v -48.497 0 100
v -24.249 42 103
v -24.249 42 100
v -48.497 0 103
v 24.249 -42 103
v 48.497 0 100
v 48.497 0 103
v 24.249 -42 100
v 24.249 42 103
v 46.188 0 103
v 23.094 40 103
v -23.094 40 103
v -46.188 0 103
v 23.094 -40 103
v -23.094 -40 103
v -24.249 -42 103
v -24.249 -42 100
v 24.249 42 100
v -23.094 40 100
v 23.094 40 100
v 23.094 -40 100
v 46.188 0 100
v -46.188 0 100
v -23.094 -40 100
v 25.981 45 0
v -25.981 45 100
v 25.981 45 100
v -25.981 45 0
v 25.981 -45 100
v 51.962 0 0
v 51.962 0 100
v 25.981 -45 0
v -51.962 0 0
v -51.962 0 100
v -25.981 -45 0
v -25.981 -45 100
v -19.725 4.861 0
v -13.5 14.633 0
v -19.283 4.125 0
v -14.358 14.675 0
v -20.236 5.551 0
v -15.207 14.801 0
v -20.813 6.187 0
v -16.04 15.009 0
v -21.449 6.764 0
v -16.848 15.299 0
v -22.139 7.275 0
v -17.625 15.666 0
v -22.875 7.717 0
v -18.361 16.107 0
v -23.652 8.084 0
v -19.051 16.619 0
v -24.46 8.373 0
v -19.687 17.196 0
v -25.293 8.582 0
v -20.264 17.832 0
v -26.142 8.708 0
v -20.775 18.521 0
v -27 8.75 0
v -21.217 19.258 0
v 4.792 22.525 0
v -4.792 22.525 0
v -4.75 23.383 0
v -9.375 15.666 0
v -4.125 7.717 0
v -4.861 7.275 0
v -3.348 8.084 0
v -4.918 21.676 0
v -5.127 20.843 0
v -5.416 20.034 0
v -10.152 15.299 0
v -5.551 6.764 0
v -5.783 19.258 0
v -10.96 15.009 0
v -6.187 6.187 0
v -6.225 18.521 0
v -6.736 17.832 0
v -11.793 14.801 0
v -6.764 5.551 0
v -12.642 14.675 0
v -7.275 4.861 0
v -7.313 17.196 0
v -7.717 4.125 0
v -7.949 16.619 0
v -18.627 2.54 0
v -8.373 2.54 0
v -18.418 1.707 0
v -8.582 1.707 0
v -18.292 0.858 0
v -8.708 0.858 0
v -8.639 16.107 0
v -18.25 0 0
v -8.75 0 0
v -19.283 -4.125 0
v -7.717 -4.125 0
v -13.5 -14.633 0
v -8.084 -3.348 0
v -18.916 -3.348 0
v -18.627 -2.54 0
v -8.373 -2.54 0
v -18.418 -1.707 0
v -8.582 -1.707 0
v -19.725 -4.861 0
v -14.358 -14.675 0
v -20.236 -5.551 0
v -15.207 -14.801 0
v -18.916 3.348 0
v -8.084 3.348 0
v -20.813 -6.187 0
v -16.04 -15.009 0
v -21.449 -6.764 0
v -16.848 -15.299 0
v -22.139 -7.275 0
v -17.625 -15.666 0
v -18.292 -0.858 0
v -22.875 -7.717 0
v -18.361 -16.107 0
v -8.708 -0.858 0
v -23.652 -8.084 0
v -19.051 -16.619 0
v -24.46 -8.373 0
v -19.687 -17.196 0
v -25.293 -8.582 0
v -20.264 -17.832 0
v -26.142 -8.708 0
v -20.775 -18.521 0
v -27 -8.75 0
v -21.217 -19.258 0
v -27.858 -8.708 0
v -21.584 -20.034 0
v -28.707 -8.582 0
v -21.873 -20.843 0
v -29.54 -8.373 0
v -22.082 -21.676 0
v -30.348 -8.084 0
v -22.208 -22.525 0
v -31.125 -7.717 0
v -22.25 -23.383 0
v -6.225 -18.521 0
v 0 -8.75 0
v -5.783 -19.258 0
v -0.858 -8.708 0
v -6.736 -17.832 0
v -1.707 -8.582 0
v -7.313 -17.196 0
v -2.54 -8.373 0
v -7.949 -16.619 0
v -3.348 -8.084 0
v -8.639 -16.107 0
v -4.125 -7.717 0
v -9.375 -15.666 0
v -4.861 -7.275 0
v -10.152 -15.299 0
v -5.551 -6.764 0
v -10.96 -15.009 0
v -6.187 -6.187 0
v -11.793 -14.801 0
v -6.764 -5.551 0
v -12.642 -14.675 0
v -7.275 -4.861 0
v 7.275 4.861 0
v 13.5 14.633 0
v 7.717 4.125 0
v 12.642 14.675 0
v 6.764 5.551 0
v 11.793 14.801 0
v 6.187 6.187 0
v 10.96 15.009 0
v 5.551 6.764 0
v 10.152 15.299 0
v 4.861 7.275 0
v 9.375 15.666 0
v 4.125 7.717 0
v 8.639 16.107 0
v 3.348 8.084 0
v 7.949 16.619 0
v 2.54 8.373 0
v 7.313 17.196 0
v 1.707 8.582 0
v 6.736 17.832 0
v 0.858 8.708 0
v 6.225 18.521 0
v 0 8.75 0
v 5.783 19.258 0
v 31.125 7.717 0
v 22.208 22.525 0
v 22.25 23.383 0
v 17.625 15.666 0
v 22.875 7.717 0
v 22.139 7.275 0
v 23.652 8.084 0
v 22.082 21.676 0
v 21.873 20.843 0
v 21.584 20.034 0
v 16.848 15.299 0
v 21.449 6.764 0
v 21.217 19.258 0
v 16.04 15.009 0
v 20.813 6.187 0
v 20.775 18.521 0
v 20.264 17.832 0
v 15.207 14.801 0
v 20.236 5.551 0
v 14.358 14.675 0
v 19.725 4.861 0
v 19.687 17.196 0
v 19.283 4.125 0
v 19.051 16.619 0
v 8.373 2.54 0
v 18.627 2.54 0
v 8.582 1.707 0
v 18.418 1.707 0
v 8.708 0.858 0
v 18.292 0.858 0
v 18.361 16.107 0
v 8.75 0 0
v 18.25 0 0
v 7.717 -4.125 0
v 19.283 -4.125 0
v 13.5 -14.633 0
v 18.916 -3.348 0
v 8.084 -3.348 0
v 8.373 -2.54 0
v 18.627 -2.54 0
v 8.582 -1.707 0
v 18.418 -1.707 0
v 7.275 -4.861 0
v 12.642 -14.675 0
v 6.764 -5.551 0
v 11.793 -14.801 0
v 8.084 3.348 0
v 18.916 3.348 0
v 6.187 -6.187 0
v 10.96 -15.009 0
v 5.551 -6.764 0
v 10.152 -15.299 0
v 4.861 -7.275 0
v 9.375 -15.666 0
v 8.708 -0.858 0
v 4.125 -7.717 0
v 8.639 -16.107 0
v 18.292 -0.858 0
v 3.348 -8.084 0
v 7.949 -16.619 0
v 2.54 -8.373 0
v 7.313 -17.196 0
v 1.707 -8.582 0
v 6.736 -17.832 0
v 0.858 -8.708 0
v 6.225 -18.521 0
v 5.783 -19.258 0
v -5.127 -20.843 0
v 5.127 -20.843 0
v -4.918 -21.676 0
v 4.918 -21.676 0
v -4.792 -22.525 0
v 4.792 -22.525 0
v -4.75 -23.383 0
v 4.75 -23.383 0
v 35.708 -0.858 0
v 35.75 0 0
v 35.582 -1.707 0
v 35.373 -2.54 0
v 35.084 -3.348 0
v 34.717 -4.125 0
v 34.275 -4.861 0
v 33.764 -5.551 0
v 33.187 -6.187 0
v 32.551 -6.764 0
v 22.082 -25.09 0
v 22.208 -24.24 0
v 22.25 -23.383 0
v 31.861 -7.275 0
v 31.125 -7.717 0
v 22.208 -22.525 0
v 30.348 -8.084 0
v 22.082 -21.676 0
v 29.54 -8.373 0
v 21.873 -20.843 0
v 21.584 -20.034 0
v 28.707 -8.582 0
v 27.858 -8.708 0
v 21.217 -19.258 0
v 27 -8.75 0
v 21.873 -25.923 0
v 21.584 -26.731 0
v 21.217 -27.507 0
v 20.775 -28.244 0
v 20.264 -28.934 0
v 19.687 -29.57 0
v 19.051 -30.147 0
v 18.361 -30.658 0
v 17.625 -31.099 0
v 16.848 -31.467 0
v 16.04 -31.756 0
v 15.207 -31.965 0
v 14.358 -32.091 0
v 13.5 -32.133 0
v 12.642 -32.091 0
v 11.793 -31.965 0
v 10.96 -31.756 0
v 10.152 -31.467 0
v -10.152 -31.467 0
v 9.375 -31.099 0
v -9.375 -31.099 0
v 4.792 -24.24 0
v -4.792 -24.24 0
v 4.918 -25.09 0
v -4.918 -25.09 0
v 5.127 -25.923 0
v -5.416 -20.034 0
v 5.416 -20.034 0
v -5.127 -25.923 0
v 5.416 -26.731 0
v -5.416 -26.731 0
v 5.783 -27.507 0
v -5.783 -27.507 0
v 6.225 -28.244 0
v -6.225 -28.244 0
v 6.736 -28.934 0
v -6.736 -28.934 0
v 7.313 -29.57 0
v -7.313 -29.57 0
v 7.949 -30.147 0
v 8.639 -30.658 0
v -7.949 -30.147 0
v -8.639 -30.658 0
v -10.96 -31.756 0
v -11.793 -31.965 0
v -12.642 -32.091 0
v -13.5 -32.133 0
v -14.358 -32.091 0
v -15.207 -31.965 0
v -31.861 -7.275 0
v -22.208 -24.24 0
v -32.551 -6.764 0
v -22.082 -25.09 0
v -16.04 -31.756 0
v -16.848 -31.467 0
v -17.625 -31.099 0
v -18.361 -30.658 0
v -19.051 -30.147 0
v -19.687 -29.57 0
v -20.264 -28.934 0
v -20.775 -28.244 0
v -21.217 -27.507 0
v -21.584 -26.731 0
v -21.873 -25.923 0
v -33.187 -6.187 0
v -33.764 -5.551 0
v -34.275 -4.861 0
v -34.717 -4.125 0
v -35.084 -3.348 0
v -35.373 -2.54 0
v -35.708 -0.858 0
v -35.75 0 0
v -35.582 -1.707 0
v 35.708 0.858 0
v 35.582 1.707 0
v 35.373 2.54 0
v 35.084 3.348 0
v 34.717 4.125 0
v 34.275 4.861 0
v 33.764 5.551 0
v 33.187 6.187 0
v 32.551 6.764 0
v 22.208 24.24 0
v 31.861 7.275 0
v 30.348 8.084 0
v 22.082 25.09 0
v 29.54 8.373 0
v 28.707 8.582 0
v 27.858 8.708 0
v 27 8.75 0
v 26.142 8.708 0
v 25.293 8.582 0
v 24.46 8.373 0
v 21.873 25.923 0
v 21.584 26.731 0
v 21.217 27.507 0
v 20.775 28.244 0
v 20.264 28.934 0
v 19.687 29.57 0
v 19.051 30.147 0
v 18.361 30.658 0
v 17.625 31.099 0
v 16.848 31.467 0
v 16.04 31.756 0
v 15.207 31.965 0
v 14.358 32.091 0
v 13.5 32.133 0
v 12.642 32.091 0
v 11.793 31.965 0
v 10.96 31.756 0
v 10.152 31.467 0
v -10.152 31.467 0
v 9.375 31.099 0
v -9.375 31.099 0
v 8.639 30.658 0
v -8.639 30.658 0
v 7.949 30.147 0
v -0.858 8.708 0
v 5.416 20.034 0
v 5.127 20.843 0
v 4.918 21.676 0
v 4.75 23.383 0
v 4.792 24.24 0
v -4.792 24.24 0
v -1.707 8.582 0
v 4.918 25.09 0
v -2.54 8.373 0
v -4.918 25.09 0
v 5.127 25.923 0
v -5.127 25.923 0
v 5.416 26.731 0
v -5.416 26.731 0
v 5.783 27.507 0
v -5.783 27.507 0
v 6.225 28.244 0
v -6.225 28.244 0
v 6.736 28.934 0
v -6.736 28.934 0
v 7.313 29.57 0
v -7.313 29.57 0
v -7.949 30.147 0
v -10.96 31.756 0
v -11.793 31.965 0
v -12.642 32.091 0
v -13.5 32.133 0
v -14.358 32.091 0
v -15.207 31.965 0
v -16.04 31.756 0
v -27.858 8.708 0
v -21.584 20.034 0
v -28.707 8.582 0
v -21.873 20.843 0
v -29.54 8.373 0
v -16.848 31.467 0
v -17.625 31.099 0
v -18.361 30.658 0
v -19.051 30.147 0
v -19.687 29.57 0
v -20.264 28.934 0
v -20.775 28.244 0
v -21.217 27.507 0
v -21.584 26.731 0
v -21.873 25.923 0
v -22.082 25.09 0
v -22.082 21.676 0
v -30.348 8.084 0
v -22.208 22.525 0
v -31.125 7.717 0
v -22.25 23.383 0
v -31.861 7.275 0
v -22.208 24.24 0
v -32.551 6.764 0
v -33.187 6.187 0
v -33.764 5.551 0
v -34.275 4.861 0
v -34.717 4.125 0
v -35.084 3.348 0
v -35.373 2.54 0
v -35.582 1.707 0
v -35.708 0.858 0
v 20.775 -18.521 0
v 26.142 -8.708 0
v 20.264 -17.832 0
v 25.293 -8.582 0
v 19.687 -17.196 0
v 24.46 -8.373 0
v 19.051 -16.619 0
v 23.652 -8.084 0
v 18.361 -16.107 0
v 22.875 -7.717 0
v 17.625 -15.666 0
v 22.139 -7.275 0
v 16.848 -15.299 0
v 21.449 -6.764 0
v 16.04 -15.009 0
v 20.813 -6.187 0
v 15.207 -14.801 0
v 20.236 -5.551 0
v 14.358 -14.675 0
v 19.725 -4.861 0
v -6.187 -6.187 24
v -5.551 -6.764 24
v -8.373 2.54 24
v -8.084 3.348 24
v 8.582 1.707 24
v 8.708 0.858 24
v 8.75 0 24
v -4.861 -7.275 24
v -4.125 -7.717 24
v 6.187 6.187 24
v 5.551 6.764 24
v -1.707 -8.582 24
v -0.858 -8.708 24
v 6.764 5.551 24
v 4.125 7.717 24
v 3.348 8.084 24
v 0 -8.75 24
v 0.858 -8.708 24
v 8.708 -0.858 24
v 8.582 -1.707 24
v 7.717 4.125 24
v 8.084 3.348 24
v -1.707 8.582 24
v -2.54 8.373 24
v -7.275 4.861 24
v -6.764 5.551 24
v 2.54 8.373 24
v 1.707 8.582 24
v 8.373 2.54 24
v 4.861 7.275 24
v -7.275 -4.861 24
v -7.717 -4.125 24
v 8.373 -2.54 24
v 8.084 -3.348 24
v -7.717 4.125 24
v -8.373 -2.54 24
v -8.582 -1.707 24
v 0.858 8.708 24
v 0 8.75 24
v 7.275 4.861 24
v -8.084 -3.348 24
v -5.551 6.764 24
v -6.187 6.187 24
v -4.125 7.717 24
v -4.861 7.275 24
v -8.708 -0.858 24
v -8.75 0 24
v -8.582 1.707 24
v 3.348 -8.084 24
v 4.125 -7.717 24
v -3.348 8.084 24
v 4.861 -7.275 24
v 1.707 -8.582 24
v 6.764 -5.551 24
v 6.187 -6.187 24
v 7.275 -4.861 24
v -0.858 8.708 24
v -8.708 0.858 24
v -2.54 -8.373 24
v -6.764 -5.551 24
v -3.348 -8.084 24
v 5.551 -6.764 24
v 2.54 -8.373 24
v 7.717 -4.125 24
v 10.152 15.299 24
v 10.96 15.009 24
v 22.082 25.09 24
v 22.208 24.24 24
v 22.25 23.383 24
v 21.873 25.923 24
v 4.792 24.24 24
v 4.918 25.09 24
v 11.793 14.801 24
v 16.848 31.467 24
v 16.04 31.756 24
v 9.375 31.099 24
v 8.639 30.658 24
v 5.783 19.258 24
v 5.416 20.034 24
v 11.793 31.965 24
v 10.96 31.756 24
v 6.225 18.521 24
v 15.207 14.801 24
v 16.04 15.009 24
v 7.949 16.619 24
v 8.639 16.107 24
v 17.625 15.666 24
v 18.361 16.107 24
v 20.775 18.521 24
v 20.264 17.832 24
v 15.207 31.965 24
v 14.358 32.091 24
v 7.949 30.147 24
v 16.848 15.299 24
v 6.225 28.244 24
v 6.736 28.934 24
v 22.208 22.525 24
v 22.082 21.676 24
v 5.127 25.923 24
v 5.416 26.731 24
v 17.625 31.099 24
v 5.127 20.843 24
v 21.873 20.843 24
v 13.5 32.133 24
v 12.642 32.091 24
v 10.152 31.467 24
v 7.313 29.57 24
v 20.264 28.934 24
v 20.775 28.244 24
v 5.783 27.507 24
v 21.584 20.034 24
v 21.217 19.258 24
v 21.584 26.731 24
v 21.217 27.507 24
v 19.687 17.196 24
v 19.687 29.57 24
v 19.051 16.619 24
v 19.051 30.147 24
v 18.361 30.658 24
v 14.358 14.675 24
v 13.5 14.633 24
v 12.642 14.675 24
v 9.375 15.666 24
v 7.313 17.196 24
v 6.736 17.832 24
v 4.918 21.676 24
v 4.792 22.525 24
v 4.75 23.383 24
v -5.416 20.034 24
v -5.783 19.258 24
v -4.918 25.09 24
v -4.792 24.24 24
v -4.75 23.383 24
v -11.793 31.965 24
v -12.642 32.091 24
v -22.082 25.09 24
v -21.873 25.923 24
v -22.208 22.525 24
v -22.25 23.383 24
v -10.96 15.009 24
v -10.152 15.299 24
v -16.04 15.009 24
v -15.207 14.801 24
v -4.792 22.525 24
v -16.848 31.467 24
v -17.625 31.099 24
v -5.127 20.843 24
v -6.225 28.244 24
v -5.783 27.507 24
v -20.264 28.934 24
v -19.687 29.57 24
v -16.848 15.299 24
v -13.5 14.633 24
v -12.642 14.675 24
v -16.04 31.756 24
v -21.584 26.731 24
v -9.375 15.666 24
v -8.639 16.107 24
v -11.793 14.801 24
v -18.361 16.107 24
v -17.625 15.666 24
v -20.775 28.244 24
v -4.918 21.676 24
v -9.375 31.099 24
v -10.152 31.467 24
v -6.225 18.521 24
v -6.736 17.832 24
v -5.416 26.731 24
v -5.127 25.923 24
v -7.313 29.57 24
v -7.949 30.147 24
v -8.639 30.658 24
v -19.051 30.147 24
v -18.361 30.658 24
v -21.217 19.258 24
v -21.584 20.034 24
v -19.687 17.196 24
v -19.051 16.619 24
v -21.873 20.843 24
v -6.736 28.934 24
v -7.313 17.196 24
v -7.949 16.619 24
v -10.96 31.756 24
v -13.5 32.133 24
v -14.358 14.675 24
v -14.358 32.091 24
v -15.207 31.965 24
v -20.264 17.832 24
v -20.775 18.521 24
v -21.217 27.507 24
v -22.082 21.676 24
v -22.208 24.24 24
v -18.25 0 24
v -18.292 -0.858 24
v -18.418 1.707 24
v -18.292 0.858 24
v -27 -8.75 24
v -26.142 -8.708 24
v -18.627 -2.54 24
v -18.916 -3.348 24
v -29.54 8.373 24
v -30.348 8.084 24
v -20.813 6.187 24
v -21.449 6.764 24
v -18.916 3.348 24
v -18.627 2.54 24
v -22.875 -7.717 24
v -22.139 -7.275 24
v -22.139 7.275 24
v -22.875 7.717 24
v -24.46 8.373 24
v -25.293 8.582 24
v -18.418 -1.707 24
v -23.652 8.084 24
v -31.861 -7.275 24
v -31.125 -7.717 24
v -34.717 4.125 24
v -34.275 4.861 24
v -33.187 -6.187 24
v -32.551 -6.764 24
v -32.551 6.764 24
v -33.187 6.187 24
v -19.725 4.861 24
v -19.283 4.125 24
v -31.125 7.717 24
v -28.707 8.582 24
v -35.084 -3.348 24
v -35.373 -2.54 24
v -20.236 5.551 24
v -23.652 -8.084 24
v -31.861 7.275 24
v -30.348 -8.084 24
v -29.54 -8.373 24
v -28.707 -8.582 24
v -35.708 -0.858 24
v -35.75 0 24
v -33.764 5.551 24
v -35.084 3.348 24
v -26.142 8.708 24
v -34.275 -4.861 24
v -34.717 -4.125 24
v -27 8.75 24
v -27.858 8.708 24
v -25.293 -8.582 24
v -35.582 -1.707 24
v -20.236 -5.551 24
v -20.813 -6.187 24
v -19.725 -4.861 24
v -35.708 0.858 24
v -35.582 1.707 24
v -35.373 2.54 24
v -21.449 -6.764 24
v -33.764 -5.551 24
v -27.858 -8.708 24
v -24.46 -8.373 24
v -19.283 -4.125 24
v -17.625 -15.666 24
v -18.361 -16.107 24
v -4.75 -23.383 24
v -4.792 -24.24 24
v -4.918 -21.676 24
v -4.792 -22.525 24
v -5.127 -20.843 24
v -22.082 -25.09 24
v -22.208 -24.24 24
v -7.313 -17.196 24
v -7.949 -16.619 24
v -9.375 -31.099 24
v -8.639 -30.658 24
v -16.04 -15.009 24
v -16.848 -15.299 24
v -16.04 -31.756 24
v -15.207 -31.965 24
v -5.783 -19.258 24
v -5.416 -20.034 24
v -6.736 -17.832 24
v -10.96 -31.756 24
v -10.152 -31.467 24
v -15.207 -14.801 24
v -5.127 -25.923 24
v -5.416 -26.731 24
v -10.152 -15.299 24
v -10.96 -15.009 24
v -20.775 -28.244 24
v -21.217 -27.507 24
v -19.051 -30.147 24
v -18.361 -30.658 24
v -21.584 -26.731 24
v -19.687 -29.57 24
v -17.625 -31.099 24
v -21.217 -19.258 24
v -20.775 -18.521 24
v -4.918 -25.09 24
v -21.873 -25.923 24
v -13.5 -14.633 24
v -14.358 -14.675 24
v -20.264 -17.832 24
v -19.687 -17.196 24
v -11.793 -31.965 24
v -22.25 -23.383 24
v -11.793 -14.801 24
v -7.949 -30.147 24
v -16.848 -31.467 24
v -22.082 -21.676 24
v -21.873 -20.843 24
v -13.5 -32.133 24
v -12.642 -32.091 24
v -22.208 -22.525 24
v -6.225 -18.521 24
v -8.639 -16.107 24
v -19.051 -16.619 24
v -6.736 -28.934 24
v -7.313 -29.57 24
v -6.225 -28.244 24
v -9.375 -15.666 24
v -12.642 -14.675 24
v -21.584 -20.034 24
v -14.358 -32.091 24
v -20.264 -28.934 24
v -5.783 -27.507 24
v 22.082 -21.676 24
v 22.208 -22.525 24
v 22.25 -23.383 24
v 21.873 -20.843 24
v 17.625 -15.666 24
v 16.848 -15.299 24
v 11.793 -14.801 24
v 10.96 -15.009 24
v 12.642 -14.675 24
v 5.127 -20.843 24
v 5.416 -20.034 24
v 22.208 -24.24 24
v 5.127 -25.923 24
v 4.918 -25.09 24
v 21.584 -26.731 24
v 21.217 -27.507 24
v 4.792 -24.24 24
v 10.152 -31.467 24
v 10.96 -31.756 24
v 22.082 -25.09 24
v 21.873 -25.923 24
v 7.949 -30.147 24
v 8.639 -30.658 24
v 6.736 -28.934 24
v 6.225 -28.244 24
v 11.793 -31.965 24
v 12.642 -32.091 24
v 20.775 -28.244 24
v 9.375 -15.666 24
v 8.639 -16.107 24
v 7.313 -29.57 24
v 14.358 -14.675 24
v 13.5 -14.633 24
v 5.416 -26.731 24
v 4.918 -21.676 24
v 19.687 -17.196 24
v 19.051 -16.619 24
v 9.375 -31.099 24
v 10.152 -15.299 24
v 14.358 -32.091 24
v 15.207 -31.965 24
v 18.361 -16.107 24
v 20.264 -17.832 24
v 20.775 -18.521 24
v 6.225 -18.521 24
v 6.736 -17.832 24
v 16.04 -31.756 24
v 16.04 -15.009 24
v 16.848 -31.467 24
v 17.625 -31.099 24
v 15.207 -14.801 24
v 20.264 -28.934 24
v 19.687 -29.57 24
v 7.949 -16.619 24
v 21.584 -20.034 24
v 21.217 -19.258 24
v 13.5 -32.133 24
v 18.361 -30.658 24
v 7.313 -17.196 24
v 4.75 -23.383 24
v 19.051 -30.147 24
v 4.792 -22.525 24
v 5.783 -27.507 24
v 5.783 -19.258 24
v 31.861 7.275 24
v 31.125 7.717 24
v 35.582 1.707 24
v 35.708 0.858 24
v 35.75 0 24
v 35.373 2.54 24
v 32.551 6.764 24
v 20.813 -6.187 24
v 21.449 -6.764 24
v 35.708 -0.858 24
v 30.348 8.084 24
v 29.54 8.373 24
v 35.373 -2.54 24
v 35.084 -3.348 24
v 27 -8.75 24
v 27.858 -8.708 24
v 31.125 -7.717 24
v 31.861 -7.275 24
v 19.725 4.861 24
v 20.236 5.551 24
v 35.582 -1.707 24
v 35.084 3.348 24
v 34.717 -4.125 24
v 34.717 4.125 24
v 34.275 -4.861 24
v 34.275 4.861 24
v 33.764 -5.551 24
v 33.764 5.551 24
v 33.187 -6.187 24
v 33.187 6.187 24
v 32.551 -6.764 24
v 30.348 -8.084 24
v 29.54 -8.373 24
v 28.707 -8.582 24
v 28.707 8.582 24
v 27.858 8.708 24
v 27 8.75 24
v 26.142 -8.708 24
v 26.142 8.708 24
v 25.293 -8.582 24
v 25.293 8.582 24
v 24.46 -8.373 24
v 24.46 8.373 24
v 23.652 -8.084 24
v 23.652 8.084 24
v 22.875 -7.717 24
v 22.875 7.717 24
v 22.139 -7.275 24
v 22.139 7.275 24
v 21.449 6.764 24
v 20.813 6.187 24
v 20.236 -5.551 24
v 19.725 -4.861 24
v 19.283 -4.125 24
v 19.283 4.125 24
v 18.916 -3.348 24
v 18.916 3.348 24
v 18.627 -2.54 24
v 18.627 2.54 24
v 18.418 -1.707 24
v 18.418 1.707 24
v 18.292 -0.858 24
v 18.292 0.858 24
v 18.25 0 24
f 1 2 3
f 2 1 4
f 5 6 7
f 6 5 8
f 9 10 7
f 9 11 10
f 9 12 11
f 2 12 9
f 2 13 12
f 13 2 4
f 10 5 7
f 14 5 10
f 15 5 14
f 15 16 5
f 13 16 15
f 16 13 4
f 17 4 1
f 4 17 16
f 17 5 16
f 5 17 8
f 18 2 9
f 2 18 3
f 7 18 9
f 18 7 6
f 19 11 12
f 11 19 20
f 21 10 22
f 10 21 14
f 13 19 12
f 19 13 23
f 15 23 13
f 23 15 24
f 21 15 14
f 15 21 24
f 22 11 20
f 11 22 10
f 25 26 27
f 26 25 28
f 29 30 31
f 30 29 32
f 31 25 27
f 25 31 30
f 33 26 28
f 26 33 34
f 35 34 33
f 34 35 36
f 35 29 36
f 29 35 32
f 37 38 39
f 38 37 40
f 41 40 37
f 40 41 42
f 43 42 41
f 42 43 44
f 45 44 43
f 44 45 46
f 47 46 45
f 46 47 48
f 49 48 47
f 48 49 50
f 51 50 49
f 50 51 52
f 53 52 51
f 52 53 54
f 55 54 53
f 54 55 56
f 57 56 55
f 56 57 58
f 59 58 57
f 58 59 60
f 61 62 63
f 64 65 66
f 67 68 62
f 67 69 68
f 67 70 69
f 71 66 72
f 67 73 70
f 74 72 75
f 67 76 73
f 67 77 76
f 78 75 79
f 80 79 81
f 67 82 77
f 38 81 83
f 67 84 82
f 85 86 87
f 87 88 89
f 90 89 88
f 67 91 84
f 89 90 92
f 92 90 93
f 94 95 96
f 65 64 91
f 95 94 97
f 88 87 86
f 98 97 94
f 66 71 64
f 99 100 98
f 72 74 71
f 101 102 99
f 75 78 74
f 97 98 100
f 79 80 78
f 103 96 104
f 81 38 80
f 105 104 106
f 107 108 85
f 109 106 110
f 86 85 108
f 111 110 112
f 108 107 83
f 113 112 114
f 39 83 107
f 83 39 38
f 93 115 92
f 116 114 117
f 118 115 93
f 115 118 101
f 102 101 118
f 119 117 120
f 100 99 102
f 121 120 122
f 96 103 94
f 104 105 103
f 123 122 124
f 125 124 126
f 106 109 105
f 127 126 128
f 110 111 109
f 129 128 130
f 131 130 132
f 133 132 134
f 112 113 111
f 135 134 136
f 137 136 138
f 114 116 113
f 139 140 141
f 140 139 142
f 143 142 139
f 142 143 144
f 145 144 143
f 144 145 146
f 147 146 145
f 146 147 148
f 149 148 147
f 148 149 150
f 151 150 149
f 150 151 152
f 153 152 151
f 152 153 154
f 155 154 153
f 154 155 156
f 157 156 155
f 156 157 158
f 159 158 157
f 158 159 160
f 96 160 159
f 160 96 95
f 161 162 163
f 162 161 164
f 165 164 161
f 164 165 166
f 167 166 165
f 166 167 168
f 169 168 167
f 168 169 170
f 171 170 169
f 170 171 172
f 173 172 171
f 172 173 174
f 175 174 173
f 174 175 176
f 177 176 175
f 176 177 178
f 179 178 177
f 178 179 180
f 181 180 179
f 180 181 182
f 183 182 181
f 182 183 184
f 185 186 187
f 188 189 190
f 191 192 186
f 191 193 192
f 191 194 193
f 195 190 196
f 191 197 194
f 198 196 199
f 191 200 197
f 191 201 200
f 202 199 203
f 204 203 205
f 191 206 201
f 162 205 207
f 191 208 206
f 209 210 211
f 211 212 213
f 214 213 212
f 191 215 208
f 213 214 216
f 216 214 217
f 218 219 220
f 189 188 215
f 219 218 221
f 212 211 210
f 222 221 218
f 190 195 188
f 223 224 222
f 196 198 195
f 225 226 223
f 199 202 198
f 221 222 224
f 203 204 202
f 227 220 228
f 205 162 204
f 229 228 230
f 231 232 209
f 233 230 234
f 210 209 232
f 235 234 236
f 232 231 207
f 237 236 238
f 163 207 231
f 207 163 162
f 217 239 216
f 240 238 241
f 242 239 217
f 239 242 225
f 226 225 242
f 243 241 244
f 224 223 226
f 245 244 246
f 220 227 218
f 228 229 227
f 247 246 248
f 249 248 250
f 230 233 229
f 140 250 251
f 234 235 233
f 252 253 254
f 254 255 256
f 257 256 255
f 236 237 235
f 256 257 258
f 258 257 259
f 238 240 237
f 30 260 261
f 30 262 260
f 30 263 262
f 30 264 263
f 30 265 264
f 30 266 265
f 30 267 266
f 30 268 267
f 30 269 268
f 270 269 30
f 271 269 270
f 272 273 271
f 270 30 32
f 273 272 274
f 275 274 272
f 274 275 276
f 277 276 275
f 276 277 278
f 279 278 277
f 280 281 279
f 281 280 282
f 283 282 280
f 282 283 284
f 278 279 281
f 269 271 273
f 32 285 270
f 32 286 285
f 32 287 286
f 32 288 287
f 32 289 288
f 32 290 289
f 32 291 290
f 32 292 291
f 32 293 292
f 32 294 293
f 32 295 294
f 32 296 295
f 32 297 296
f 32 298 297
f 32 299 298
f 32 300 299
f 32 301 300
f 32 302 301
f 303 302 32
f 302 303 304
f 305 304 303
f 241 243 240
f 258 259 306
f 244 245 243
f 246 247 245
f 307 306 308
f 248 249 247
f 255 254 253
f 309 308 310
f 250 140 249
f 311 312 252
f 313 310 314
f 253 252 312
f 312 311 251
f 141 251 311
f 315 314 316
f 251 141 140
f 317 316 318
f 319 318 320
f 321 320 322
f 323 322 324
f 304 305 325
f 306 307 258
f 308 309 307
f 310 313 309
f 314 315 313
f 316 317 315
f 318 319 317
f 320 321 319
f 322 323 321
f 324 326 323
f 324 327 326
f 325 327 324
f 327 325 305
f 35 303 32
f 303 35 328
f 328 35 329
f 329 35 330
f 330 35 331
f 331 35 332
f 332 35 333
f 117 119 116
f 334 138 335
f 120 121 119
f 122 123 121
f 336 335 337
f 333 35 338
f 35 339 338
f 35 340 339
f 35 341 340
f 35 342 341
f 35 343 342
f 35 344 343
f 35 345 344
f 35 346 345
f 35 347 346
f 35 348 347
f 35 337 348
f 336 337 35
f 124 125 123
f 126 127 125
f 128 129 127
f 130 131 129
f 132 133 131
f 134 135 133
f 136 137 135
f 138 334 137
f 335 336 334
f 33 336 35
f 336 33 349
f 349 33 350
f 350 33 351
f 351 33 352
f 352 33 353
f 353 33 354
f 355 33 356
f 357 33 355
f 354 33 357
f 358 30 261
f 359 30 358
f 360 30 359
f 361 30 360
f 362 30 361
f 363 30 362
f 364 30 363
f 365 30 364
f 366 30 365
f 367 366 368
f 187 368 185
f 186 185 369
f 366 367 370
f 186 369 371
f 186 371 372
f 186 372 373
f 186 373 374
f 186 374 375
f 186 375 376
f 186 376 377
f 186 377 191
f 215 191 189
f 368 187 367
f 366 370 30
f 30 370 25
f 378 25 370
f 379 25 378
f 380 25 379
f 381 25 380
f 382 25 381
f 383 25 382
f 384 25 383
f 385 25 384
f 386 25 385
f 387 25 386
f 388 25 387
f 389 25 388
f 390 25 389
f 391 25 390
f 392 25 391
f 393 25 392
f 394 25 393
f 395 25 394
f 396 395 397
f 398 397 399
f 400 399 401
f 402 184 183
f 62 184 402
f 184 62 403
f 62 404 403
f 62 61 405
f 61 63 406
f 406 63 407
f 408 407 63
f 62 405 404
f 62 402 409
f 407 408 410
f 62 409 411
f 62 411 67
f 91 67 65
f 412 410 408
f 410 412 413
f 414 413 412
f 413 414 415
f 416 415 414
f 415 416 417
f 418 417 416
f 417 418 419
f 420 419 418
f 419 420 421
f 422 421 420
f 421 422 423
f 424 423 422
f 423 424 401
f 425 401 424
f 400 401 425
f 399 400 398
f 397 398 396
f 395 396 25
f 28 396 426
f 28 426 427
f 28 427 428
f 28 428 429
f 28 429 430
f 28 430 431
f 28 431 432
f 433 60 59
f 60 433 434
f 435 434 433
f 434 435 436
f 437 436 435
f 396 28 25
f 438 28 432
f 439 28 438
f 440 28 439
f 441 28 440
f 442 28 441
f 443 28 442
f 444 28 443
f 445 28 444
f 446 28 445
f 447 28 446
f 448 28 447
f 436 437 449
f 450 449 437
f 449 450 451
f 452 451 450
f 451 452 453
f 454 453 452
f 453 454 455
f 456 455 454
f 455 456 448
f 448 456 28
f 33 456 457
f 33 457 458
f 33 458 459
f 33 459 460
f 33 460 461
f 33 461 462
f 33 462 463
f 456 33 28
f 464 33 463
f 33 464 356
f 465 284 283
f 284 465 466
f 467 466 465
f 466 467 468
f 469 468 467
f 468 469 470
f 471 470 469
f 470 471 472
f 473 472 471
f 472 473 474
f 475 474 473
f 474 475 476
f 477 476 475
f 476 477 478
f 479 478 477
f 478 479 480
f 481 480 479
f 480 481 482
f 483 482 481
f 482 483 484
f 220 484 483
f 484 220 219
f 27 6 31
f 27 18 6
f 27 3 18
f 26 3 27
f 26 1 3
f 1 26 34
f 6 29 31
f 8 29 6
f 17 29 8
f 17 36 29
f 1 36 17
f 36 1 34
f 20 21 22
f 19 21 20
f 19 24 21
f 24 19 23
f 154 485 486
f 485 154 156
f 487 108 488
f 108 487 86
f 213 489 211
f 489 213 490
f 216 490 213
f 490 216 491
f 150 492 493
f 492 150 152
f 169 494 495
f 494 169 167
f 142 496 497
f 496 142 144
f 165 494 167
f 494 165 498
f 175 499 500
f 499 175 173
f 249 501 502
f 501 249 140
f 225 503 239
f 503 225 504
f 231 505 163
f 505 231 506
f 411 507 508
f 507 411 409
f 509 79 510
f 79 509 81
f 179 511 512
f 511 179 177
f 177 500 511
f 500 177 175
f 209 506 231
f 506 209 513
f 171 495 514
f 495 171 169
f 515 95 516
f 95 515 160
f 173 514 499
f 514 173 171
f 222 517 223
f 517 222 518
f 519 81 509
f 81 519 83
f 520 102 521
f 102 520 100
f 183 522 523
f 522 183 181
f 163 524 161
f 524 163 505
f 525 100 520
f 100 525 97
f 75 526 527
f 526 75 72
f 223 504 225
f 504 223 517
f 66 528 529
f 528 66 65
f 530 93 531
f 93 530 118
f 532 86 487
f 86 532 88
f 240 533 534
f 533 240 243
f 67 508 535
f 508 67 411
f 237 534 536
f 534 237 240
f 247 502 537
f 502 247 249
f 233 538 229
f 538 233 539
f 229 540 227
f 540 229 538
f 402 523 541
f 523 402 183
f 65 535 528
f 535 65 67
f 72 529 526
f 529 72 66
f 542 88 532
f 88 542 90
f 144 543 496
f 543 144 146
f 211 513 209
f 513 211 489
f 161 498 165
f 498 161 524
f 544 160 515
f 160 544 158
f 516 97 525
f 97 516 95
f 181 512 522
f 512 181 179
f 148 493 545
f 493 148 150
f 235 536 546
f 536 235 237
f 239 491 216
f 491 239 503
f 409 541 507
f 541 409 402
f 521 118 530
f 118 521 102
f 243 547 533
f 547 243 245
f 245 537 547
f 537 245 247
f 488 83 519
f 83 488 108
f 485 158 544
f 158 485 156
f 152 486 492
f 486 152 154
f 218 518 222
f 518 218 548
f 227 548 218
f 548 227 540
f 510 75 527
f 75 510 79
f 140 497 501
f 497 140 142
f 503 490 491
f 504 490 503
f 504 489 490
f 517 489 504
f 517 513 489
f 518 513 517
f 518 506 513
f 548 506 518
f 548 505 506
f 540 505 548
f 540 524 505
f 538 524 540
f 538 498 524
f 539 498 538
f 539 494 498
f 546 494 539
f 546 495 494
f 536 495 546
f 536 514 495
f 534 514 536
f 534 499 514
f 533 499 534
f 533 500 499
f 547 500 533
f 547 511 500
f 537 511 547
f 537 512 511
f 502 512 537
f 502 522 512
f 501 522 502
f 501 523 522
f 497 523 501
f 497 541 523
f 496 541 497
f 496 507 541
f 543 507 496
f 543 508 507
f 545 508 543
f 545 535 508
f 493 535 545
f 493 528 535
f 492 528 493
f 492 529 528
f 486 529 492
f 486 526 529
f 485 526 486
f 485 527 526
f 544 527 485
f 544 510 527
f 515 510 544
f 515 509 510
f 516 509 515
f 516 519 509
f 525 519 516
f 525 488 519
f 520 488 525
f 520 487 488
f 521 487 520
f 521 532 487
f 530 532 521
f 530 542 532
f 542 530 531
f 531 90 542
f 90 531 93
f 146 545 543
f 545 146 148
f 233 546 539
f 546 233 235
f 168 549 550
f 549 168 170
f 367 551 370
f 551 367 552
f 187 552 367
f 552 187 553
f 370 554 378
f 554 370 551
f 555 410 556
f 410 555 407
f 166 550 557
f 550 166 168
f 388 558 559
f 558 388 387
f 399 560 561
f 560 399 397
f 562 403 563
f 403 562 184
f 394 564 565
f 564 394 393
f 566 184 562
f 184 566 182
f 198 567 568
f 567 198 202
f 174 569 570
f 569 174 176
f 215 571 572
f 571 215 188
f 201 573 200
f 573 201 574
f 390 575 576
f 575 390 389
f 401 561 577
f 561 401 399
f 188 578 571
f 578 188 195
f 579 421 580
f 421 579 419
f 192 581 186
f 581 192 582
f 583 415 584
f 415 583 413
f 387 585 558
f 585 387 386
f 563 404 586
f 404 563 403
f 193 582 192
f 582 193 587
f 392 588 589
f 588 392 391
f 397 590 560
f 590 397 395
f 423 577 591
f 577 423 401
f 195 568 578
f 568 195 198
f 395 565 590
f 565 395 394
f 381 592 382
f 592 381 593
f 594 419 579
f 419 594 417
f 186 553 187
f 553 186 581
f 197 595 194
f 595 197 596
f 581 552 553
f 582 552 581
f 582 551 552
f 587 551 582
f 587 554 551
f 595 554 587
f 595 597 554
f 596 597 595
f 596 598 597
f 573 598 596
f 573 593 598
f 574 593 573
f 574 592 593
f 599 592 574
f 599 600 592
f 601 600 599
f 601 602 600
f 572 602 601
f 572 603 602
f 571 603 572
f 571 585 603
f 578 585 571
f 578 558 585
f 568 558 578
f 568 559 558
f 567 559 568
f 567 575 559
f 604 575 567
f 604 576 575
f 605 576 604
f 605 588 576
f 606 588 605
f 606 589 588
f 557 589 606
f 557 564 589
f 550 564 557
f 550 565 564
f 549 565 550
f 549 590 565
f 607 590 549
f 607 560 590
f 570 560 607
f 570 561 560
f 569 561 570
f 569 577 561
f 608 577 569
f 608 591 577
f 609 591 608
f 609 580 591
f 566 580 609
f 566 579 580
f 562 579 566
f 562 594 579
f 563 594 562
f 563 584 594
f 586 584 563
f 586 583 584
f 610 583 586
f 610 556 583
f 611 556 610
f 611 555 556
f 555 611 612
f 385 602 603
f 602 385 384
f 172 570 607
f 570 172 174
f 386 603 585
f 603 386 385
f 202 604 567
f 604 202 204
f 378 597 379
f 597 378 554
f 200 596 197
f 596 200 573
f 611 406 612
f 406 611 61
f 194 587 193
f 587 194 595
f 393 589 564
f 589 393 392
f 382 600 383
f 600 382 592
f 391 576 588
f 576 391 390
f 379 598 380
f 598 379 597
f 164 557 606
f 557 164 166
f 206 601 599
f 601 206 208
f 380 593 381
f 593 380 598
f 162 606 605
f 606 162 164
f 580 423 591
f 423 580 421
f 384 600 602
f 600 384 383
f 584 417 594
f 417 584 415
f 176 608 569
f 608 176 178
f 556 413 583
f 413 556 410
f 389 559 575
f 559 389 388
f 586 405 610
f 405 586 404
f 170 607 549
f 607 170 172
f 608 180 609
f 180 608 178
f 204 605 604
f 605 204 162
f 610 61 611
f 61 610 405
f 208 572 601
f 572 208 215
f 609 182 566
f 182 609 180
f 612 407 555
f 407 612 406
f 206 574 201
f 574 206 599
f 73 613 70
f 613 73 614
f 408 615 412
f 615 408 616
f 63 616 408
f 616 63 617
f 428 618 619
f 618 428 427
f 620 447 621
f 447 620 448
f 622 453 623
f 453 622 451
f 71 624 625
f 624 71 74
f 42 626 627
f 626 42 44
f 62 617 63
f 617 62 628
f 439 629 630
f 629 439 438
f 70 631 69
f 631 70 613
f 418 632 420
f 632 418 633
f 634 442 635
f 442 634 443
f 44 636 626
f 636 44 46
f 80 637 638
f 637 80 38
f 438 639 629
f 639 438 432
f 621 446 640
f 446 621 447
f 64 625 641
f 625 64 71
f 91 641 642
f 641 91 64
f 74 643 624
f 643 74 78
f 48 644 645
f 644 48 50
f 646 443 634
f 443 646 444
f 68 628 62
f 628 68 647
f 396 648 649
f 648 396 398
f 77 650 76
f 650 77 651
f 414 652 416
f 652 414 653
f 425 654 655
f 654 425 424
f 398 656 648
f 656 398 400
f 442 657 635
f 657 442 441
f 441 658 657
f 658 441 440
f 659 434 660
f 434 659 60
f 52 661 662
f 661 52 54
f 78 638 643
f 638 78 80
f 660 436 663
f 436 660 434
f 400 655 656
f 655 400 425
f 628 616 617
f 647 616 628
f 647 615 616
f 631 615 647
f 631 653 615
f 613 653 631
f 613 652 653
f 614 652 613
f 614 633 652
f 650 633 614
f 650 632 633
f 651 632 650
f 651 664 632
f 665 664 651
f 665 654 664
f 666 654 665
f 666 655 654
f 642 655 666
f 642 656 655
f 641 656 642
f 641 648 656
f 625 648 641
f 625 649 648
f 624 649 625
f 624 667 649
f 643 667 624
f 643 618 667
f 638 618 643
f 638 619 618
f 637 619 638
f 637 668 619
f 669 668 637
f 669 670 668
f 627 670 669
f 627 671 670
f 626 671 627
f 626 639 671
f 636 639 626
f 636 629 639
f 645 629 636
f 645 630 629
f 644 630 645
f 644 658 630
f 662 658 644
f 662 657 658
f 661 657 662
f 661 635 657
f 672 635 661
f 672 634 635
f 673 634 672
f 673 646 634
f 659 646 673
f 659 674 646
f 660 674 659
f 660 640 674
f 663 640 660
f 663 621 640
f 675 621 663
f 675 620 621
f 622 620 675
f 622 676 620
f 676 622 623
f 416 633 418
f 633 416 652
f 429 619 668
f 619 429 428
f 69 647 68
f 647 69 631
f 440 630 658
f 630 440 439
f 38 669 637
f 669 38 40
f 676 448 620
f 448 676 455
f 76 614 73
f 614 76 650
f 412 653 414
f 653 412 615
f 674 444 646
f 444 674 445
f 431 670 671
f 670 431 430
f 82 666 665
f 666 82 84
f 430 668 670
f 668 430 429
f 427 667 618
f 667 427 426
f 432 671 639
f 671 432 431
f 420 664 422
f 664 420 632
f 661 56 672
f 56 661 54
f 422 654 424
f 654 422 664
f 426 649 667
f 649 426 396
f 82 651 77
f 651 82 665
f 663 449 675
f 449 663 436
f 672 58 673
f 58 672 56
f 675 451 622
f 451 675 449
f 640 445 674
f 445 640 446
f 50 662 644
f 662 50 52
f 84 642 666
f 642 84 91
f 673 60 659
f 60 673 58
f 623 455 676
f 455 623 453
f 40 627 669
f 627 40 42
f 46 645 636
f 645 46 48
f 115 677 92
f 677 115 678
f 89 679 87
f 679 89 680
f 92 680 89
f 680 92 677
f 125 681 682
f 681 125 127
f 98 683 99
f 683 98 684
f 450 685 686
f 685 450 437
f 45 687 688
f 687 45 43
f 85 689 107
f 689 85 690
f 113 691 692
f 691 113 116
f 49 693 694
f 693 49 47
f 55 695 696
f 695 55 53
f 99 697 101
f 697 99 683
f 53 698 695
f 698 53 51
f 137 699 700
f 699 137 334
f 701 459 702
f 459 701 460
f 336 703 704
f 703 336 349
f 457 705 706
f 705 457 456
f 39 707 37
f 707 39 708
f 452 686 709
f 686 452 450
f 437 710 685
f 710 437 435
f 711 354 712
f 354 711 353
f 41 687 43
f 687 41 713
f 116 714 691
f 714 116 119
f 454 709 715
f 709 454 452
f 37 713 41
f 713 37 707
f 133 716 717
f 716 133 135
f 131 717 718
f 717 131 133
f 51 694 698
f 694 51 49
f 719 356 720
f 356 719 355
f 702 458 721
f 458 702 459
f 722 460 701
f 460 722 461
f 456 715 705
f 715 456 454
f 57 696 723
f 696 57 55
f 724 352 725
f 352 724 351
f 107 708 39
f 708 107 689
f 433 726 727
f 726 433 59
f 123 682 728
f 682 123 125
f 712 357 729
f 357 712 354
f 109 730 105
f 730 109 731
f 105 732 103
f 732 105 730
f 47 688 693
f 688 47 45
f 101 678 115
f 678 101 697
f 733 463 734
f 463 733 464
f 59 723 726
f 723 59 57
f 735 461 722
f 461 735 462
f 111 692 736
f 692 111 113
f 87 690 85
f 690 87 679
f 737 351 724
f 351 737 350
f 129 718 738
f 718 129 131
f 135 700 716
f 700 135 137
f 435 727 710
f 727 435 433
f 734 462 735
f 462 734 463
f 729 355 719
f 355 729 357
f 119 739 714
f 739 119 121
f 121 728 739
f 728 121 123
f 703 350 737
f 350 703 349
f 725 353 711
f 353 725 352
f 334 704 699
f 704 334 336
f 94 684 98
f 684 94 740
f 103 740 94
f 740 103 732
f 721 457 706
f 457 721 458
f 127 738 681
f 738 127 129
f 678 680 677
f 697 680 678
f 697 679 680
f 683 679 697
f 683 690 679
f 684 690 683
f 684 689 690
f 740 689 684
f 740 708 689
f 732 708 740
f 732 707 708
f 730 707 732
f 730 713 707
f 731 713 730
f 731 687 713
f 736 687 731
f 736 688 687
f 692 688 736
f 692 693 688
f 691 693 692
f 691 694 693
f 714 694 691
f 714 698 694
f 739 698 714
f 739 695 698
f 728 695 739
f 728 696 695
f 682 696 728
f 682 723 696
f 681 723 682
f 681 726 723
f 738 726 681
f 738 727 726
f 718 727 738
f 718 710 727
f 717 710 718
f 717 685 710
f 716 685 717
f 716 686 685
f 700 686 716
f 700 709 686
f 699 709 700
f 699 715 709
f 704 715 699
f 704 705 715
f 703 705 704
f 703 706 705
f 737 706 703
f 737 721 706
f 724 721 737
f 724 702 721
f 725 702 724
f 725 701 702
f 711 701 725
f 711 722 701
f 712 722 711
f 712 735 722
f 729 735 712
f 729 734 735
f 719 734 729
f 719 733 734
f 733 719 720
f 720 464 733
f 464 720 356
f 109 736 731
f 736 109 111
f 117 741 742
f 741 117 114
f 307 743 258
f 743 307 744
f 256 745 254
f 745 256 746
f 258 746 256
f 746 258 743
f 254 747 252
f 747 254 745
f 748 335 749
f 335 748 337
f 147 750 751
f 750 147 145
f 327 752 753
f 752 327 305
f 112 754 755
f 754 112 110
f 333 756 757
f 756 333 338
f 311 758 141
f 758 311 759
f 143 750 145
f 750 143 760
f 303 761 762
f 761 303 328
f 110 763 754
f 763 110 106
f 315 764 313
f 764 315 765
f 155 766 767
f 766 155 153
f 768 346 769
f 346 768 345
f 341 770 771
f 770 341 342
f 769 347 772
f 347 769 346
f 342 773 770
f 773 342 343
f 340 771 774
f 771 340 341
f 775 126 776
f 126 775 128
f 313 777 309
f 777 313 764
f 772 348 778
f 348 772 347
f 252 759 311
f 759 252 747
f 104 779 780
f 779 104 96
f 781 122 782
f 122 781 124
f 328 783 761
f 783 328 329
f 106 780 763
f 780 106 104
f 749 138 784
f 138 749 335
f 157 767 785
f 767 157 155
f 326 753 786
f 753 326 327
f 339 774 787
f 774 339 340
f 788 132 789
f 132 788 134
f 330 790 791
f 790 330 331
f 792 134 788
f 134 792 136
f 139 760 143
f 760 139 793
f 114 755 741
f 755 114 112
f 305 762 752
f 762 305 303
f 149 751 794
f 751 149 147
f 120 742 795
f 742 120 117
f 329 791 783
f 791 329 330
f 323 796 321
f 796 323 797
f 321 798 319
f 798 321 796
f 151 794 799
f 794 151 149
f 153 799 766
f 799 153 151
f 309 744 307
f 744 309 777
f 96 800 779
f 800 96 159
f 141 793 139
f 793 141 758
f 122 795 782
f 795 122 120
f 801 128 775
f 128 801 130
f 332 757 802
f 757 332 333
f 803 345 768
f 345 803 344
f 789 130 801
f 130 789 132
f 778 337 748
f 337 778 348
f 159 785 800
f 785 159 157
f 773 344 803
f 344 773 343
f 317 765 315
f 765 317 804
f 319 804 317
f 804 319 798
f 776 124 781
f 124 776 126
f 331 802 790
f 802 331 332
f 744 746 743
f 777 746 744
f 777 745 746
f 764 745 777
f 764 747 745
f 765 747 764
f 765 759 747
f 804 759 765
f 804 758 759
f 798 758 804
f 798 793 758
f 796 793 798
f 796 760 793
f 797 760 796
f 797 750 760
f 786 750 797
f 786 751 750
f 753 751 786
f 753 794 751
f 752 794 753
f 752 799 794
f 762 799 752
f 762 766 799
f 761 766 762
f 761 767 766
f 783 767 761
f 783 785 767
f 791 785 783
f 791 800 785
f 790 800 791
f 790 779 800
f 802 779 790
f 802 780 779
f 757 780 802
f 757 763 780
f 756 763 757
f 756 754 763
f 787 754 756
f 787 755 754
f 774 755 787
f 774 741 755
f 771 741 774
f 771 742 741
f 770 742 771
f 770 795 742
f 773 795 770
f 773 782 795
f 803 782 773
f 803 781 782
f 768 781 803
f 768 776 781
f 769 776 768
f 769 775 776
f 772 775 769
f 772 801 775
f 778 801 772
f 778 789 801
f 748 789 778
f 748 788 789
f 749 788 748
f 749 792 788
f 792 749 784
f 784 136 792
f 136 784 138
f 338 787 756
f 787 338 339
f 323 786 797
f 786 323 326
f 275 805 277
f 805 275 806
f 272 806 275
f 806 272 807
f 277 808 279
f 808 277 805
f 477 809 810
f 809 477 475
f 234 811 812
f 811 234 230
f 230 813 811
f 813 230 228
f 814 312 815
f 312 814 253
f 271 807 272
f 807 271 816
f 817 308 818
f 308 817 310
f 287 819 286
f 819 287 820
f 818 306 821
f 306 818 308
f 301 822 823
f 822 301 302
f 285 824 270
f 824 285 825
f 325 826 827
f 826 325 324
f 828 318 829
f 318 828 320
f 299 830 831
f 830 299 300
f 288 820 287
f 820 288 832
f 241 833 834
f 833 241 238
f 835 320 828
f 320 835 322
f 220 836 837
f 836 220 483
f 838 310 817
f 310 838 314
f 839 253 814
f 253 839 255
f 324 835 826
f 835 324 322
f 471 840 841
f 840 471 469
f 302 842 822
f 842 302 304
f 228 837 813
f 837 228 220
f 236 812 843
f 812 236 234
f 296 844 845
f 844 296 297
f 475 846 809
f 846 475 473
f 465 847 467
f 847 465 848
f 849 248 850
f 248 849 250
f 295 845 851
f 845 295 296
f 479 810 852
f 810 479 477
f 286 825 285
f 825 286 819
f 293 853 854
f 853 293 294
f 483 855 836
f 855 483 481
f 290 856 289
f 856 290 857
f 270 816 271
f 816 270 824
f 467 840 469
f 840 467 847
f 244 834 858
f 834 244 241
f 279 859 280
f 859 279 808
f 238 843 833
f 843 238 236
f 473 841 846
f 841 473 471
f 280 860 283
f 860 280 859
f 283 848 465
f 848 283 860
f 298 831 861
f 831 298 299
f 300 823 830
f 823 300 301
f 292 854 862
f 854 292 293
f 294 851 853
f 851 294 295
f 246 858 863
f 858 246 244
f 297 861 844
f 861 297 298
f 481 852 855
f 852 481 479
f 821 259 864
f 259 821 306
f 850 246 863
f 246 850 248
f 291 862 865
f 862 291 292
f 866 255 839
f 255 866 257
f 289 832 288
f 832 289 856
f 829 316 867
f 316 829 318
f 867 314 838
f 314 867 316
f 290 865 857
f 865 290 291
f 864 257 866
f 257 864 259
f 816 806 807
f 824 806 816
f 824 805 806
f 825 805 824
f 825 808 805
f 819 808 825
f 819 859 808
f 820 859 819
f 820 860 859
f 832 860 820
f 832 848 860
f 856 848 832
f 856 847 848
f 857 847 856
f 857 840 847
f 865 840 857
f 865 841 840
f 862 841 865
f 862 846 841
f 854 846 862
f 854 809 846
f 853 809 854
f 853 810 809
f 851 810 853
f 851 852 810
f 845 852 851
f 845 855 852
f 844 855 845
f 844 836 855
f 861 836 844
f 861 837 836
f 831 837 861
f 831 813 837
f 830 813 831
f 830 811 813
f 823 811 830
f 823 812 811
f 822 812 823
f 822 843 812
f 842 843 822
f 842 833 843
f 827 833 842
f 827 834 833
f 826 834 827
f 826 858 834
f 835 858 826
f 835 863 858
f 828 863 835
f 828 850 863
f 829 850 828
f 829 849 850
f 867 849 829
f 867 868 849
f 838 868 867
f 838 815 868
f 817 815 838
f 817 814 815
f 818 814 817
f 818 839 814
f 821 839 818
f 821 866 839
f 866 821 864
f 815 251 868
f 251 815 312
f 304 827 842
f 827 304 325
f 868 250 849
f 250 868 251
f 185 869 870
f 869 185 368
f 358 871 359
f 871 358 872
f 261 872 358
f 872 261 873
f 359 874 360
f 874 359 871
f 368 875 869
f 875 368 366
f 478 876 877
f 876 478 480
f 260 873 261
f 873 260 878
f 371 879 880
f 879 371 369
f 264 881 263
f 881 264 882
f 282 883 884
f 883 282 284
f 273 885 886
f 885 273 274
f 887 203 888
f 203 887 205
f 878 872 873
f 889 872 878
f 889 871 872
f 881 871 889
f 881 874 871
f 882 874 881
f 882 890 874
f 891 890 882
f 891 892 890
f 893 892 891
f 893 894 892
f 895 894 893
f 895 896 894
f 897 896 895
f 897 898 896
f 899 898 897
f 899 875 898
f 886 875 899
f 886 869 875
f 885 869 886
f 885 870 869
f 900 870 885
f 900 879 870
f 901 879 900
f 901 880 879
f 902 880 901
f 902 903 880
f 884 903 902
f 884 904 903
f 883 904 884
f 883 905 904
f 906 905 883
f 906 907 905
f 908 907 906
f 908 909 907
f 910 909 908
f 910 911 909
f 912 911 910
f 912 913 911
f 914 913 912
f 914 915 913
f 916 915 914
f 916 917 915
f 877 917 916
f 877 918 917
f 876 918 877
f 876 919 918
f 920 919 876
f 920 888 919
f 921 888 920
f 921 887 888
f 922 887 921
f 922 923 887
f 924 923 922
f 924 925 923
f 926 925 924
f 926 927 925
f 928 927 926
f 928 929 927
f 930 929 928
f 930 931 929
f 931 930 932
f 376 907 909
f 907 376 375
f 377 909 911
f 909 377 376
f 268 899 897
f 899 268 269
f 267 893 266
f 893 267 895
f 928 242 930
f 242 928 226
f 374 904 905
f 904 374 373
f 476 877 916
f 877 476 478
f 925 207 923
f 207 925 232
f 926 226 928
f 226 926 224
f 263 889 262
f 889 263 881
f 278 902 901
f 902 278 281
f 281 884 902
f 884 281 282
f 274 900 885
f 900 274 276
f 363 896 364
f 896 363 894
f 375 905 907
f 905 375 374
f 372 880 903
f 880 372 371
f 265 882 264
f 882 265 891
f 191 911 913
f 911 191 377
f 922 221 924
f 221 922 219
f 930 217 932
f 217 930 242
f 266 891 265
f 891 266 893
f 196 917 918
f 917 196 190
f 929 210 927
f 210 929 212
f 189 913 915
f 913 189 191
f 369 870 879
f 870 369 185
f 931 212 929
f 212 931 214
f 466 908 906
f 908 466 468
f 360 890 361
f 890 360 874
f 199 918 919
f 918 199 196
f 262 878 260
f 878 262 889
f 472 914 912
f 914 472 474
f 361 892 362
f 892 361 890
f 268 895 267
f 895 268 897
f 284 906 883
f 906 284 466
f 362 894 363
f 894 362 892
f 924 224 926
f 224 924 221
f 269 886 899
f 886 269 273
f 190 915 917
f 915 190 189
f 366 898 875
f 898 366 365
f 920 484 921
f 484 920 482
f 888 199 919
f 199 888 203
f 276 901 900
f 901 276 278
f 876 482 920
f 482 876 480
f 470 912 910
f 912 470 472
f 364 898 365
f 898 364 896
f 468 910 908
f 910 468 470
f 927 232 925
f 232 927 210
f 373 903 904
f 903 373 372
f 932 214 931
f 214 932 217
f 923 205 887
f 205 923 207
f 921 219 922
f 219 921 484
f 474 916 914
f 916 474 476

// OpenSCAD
// Float for 7 x 15 mL conical tubes, printed upside down.
// Rests on the XY plane at z = 0 and builds upward (+Z).
// Centred on the origin in X and Y.

$fn = 64;

// ---- Plate (flat hexagon, 2 flats parallel to X axis) ----
plate_af = 90;   // across flats (mm)
plate_t  = 3;    // plate thickness (mm)

// ---- Tube sleeves (7 x 17.5 mm holes, 2 mm wall) ----
hole_d   = 17.5; // through-hole diameter (mm)
sleeve_od= 21.5; // sleeve outside diameter (mm)  (17.5 + 2*2)
sleeve_h = 20;   // sleeve height above plate (mm)

// ---- Hexagonal skirt (2 mm wall, sides parallel to plate) ----
skirt_af = 84;   // across flats, outside (mm)  (90 - 2*3)
skirt_t  = 2;    // skirt wall thickness (mm)
skirt_h  = 20;   // skirt height above plate (mm)

// ---- Hole pattern: 1 centre + 6 on a 54 mm circle, 60 deg apart, first on +X ----
ring_d   = 54;   // circle diameter (mm)
ring_r   = ring_d / 2;   // 27 mm

// ---- Helper: regular hexagon, 'across flats' = 2*apothem, two flats parallel to X ----
module hexagon(af) {
    a = af / 2;                 // apothem
    R = a / cos(30);            // circumradius
    pts = [for (i = [0:5]) [R * cos(60 * i), R * sin(60 * i)]];
    polygon(pts);
}

// ---- Helper: one tube sleeve (outer cylinder minus through-hole) ----
module sleeve() {
    difference() {
        cylinder(h = sleeve_h, d = sleeve_od);
        cylinder(h = sleeve_h + 1, d = hole_d);   // 1 mm past top, 1 mm below bottom
    }
}

// ---- Helper: hexagonal skirt (outer hexagon minus inner hexagon) ----
module skirt() {
    difference() {
        linear_extrude(h = skirt_h) hexagon(skirt_af);   // outer, 84 across flats
        linear_extrude(h = skirt_h + 1) hexagon(skirt_af - 2 * skirt_t); // inner, 80 across flats
    }
}

// ---- Build the float ----
difference() {
    union() {
        // Flat hexagonal plate, z = 0 to 3
        linear_extrude(h = plate_t) hexagon(plate_af);

        // Seven sleeves rising from the plate top (z = 3) to z = 20
        translate([0, 0, plate_t]) {
            sleeve();                                   // centre hole
            for (i = [0:5]) {
                translate([ring_r * cos(60 * i), ring_r * sin(60 * i), 0])
                    sleeve();                           // six on 54 mm circle
            }
        }

        // Hexagonal skirt rising from the plate top (z = 3) to z = 20
        translate([0, 0, plate_t]) skirt();
    }

    // Seven 17.5 mm through-holes, cut through the whole part (1 mm past each face)
    for (i = [0:6]) {
        p = (i == 0) ? [0, 0] : [ring_r * cos(60 * i), ring_r * sin(60 * i)];
        translate([p[0], p[1], -1])
            cylinder(h = plate_t + sleeve_h + 2, d = hole_d);
    }
}
